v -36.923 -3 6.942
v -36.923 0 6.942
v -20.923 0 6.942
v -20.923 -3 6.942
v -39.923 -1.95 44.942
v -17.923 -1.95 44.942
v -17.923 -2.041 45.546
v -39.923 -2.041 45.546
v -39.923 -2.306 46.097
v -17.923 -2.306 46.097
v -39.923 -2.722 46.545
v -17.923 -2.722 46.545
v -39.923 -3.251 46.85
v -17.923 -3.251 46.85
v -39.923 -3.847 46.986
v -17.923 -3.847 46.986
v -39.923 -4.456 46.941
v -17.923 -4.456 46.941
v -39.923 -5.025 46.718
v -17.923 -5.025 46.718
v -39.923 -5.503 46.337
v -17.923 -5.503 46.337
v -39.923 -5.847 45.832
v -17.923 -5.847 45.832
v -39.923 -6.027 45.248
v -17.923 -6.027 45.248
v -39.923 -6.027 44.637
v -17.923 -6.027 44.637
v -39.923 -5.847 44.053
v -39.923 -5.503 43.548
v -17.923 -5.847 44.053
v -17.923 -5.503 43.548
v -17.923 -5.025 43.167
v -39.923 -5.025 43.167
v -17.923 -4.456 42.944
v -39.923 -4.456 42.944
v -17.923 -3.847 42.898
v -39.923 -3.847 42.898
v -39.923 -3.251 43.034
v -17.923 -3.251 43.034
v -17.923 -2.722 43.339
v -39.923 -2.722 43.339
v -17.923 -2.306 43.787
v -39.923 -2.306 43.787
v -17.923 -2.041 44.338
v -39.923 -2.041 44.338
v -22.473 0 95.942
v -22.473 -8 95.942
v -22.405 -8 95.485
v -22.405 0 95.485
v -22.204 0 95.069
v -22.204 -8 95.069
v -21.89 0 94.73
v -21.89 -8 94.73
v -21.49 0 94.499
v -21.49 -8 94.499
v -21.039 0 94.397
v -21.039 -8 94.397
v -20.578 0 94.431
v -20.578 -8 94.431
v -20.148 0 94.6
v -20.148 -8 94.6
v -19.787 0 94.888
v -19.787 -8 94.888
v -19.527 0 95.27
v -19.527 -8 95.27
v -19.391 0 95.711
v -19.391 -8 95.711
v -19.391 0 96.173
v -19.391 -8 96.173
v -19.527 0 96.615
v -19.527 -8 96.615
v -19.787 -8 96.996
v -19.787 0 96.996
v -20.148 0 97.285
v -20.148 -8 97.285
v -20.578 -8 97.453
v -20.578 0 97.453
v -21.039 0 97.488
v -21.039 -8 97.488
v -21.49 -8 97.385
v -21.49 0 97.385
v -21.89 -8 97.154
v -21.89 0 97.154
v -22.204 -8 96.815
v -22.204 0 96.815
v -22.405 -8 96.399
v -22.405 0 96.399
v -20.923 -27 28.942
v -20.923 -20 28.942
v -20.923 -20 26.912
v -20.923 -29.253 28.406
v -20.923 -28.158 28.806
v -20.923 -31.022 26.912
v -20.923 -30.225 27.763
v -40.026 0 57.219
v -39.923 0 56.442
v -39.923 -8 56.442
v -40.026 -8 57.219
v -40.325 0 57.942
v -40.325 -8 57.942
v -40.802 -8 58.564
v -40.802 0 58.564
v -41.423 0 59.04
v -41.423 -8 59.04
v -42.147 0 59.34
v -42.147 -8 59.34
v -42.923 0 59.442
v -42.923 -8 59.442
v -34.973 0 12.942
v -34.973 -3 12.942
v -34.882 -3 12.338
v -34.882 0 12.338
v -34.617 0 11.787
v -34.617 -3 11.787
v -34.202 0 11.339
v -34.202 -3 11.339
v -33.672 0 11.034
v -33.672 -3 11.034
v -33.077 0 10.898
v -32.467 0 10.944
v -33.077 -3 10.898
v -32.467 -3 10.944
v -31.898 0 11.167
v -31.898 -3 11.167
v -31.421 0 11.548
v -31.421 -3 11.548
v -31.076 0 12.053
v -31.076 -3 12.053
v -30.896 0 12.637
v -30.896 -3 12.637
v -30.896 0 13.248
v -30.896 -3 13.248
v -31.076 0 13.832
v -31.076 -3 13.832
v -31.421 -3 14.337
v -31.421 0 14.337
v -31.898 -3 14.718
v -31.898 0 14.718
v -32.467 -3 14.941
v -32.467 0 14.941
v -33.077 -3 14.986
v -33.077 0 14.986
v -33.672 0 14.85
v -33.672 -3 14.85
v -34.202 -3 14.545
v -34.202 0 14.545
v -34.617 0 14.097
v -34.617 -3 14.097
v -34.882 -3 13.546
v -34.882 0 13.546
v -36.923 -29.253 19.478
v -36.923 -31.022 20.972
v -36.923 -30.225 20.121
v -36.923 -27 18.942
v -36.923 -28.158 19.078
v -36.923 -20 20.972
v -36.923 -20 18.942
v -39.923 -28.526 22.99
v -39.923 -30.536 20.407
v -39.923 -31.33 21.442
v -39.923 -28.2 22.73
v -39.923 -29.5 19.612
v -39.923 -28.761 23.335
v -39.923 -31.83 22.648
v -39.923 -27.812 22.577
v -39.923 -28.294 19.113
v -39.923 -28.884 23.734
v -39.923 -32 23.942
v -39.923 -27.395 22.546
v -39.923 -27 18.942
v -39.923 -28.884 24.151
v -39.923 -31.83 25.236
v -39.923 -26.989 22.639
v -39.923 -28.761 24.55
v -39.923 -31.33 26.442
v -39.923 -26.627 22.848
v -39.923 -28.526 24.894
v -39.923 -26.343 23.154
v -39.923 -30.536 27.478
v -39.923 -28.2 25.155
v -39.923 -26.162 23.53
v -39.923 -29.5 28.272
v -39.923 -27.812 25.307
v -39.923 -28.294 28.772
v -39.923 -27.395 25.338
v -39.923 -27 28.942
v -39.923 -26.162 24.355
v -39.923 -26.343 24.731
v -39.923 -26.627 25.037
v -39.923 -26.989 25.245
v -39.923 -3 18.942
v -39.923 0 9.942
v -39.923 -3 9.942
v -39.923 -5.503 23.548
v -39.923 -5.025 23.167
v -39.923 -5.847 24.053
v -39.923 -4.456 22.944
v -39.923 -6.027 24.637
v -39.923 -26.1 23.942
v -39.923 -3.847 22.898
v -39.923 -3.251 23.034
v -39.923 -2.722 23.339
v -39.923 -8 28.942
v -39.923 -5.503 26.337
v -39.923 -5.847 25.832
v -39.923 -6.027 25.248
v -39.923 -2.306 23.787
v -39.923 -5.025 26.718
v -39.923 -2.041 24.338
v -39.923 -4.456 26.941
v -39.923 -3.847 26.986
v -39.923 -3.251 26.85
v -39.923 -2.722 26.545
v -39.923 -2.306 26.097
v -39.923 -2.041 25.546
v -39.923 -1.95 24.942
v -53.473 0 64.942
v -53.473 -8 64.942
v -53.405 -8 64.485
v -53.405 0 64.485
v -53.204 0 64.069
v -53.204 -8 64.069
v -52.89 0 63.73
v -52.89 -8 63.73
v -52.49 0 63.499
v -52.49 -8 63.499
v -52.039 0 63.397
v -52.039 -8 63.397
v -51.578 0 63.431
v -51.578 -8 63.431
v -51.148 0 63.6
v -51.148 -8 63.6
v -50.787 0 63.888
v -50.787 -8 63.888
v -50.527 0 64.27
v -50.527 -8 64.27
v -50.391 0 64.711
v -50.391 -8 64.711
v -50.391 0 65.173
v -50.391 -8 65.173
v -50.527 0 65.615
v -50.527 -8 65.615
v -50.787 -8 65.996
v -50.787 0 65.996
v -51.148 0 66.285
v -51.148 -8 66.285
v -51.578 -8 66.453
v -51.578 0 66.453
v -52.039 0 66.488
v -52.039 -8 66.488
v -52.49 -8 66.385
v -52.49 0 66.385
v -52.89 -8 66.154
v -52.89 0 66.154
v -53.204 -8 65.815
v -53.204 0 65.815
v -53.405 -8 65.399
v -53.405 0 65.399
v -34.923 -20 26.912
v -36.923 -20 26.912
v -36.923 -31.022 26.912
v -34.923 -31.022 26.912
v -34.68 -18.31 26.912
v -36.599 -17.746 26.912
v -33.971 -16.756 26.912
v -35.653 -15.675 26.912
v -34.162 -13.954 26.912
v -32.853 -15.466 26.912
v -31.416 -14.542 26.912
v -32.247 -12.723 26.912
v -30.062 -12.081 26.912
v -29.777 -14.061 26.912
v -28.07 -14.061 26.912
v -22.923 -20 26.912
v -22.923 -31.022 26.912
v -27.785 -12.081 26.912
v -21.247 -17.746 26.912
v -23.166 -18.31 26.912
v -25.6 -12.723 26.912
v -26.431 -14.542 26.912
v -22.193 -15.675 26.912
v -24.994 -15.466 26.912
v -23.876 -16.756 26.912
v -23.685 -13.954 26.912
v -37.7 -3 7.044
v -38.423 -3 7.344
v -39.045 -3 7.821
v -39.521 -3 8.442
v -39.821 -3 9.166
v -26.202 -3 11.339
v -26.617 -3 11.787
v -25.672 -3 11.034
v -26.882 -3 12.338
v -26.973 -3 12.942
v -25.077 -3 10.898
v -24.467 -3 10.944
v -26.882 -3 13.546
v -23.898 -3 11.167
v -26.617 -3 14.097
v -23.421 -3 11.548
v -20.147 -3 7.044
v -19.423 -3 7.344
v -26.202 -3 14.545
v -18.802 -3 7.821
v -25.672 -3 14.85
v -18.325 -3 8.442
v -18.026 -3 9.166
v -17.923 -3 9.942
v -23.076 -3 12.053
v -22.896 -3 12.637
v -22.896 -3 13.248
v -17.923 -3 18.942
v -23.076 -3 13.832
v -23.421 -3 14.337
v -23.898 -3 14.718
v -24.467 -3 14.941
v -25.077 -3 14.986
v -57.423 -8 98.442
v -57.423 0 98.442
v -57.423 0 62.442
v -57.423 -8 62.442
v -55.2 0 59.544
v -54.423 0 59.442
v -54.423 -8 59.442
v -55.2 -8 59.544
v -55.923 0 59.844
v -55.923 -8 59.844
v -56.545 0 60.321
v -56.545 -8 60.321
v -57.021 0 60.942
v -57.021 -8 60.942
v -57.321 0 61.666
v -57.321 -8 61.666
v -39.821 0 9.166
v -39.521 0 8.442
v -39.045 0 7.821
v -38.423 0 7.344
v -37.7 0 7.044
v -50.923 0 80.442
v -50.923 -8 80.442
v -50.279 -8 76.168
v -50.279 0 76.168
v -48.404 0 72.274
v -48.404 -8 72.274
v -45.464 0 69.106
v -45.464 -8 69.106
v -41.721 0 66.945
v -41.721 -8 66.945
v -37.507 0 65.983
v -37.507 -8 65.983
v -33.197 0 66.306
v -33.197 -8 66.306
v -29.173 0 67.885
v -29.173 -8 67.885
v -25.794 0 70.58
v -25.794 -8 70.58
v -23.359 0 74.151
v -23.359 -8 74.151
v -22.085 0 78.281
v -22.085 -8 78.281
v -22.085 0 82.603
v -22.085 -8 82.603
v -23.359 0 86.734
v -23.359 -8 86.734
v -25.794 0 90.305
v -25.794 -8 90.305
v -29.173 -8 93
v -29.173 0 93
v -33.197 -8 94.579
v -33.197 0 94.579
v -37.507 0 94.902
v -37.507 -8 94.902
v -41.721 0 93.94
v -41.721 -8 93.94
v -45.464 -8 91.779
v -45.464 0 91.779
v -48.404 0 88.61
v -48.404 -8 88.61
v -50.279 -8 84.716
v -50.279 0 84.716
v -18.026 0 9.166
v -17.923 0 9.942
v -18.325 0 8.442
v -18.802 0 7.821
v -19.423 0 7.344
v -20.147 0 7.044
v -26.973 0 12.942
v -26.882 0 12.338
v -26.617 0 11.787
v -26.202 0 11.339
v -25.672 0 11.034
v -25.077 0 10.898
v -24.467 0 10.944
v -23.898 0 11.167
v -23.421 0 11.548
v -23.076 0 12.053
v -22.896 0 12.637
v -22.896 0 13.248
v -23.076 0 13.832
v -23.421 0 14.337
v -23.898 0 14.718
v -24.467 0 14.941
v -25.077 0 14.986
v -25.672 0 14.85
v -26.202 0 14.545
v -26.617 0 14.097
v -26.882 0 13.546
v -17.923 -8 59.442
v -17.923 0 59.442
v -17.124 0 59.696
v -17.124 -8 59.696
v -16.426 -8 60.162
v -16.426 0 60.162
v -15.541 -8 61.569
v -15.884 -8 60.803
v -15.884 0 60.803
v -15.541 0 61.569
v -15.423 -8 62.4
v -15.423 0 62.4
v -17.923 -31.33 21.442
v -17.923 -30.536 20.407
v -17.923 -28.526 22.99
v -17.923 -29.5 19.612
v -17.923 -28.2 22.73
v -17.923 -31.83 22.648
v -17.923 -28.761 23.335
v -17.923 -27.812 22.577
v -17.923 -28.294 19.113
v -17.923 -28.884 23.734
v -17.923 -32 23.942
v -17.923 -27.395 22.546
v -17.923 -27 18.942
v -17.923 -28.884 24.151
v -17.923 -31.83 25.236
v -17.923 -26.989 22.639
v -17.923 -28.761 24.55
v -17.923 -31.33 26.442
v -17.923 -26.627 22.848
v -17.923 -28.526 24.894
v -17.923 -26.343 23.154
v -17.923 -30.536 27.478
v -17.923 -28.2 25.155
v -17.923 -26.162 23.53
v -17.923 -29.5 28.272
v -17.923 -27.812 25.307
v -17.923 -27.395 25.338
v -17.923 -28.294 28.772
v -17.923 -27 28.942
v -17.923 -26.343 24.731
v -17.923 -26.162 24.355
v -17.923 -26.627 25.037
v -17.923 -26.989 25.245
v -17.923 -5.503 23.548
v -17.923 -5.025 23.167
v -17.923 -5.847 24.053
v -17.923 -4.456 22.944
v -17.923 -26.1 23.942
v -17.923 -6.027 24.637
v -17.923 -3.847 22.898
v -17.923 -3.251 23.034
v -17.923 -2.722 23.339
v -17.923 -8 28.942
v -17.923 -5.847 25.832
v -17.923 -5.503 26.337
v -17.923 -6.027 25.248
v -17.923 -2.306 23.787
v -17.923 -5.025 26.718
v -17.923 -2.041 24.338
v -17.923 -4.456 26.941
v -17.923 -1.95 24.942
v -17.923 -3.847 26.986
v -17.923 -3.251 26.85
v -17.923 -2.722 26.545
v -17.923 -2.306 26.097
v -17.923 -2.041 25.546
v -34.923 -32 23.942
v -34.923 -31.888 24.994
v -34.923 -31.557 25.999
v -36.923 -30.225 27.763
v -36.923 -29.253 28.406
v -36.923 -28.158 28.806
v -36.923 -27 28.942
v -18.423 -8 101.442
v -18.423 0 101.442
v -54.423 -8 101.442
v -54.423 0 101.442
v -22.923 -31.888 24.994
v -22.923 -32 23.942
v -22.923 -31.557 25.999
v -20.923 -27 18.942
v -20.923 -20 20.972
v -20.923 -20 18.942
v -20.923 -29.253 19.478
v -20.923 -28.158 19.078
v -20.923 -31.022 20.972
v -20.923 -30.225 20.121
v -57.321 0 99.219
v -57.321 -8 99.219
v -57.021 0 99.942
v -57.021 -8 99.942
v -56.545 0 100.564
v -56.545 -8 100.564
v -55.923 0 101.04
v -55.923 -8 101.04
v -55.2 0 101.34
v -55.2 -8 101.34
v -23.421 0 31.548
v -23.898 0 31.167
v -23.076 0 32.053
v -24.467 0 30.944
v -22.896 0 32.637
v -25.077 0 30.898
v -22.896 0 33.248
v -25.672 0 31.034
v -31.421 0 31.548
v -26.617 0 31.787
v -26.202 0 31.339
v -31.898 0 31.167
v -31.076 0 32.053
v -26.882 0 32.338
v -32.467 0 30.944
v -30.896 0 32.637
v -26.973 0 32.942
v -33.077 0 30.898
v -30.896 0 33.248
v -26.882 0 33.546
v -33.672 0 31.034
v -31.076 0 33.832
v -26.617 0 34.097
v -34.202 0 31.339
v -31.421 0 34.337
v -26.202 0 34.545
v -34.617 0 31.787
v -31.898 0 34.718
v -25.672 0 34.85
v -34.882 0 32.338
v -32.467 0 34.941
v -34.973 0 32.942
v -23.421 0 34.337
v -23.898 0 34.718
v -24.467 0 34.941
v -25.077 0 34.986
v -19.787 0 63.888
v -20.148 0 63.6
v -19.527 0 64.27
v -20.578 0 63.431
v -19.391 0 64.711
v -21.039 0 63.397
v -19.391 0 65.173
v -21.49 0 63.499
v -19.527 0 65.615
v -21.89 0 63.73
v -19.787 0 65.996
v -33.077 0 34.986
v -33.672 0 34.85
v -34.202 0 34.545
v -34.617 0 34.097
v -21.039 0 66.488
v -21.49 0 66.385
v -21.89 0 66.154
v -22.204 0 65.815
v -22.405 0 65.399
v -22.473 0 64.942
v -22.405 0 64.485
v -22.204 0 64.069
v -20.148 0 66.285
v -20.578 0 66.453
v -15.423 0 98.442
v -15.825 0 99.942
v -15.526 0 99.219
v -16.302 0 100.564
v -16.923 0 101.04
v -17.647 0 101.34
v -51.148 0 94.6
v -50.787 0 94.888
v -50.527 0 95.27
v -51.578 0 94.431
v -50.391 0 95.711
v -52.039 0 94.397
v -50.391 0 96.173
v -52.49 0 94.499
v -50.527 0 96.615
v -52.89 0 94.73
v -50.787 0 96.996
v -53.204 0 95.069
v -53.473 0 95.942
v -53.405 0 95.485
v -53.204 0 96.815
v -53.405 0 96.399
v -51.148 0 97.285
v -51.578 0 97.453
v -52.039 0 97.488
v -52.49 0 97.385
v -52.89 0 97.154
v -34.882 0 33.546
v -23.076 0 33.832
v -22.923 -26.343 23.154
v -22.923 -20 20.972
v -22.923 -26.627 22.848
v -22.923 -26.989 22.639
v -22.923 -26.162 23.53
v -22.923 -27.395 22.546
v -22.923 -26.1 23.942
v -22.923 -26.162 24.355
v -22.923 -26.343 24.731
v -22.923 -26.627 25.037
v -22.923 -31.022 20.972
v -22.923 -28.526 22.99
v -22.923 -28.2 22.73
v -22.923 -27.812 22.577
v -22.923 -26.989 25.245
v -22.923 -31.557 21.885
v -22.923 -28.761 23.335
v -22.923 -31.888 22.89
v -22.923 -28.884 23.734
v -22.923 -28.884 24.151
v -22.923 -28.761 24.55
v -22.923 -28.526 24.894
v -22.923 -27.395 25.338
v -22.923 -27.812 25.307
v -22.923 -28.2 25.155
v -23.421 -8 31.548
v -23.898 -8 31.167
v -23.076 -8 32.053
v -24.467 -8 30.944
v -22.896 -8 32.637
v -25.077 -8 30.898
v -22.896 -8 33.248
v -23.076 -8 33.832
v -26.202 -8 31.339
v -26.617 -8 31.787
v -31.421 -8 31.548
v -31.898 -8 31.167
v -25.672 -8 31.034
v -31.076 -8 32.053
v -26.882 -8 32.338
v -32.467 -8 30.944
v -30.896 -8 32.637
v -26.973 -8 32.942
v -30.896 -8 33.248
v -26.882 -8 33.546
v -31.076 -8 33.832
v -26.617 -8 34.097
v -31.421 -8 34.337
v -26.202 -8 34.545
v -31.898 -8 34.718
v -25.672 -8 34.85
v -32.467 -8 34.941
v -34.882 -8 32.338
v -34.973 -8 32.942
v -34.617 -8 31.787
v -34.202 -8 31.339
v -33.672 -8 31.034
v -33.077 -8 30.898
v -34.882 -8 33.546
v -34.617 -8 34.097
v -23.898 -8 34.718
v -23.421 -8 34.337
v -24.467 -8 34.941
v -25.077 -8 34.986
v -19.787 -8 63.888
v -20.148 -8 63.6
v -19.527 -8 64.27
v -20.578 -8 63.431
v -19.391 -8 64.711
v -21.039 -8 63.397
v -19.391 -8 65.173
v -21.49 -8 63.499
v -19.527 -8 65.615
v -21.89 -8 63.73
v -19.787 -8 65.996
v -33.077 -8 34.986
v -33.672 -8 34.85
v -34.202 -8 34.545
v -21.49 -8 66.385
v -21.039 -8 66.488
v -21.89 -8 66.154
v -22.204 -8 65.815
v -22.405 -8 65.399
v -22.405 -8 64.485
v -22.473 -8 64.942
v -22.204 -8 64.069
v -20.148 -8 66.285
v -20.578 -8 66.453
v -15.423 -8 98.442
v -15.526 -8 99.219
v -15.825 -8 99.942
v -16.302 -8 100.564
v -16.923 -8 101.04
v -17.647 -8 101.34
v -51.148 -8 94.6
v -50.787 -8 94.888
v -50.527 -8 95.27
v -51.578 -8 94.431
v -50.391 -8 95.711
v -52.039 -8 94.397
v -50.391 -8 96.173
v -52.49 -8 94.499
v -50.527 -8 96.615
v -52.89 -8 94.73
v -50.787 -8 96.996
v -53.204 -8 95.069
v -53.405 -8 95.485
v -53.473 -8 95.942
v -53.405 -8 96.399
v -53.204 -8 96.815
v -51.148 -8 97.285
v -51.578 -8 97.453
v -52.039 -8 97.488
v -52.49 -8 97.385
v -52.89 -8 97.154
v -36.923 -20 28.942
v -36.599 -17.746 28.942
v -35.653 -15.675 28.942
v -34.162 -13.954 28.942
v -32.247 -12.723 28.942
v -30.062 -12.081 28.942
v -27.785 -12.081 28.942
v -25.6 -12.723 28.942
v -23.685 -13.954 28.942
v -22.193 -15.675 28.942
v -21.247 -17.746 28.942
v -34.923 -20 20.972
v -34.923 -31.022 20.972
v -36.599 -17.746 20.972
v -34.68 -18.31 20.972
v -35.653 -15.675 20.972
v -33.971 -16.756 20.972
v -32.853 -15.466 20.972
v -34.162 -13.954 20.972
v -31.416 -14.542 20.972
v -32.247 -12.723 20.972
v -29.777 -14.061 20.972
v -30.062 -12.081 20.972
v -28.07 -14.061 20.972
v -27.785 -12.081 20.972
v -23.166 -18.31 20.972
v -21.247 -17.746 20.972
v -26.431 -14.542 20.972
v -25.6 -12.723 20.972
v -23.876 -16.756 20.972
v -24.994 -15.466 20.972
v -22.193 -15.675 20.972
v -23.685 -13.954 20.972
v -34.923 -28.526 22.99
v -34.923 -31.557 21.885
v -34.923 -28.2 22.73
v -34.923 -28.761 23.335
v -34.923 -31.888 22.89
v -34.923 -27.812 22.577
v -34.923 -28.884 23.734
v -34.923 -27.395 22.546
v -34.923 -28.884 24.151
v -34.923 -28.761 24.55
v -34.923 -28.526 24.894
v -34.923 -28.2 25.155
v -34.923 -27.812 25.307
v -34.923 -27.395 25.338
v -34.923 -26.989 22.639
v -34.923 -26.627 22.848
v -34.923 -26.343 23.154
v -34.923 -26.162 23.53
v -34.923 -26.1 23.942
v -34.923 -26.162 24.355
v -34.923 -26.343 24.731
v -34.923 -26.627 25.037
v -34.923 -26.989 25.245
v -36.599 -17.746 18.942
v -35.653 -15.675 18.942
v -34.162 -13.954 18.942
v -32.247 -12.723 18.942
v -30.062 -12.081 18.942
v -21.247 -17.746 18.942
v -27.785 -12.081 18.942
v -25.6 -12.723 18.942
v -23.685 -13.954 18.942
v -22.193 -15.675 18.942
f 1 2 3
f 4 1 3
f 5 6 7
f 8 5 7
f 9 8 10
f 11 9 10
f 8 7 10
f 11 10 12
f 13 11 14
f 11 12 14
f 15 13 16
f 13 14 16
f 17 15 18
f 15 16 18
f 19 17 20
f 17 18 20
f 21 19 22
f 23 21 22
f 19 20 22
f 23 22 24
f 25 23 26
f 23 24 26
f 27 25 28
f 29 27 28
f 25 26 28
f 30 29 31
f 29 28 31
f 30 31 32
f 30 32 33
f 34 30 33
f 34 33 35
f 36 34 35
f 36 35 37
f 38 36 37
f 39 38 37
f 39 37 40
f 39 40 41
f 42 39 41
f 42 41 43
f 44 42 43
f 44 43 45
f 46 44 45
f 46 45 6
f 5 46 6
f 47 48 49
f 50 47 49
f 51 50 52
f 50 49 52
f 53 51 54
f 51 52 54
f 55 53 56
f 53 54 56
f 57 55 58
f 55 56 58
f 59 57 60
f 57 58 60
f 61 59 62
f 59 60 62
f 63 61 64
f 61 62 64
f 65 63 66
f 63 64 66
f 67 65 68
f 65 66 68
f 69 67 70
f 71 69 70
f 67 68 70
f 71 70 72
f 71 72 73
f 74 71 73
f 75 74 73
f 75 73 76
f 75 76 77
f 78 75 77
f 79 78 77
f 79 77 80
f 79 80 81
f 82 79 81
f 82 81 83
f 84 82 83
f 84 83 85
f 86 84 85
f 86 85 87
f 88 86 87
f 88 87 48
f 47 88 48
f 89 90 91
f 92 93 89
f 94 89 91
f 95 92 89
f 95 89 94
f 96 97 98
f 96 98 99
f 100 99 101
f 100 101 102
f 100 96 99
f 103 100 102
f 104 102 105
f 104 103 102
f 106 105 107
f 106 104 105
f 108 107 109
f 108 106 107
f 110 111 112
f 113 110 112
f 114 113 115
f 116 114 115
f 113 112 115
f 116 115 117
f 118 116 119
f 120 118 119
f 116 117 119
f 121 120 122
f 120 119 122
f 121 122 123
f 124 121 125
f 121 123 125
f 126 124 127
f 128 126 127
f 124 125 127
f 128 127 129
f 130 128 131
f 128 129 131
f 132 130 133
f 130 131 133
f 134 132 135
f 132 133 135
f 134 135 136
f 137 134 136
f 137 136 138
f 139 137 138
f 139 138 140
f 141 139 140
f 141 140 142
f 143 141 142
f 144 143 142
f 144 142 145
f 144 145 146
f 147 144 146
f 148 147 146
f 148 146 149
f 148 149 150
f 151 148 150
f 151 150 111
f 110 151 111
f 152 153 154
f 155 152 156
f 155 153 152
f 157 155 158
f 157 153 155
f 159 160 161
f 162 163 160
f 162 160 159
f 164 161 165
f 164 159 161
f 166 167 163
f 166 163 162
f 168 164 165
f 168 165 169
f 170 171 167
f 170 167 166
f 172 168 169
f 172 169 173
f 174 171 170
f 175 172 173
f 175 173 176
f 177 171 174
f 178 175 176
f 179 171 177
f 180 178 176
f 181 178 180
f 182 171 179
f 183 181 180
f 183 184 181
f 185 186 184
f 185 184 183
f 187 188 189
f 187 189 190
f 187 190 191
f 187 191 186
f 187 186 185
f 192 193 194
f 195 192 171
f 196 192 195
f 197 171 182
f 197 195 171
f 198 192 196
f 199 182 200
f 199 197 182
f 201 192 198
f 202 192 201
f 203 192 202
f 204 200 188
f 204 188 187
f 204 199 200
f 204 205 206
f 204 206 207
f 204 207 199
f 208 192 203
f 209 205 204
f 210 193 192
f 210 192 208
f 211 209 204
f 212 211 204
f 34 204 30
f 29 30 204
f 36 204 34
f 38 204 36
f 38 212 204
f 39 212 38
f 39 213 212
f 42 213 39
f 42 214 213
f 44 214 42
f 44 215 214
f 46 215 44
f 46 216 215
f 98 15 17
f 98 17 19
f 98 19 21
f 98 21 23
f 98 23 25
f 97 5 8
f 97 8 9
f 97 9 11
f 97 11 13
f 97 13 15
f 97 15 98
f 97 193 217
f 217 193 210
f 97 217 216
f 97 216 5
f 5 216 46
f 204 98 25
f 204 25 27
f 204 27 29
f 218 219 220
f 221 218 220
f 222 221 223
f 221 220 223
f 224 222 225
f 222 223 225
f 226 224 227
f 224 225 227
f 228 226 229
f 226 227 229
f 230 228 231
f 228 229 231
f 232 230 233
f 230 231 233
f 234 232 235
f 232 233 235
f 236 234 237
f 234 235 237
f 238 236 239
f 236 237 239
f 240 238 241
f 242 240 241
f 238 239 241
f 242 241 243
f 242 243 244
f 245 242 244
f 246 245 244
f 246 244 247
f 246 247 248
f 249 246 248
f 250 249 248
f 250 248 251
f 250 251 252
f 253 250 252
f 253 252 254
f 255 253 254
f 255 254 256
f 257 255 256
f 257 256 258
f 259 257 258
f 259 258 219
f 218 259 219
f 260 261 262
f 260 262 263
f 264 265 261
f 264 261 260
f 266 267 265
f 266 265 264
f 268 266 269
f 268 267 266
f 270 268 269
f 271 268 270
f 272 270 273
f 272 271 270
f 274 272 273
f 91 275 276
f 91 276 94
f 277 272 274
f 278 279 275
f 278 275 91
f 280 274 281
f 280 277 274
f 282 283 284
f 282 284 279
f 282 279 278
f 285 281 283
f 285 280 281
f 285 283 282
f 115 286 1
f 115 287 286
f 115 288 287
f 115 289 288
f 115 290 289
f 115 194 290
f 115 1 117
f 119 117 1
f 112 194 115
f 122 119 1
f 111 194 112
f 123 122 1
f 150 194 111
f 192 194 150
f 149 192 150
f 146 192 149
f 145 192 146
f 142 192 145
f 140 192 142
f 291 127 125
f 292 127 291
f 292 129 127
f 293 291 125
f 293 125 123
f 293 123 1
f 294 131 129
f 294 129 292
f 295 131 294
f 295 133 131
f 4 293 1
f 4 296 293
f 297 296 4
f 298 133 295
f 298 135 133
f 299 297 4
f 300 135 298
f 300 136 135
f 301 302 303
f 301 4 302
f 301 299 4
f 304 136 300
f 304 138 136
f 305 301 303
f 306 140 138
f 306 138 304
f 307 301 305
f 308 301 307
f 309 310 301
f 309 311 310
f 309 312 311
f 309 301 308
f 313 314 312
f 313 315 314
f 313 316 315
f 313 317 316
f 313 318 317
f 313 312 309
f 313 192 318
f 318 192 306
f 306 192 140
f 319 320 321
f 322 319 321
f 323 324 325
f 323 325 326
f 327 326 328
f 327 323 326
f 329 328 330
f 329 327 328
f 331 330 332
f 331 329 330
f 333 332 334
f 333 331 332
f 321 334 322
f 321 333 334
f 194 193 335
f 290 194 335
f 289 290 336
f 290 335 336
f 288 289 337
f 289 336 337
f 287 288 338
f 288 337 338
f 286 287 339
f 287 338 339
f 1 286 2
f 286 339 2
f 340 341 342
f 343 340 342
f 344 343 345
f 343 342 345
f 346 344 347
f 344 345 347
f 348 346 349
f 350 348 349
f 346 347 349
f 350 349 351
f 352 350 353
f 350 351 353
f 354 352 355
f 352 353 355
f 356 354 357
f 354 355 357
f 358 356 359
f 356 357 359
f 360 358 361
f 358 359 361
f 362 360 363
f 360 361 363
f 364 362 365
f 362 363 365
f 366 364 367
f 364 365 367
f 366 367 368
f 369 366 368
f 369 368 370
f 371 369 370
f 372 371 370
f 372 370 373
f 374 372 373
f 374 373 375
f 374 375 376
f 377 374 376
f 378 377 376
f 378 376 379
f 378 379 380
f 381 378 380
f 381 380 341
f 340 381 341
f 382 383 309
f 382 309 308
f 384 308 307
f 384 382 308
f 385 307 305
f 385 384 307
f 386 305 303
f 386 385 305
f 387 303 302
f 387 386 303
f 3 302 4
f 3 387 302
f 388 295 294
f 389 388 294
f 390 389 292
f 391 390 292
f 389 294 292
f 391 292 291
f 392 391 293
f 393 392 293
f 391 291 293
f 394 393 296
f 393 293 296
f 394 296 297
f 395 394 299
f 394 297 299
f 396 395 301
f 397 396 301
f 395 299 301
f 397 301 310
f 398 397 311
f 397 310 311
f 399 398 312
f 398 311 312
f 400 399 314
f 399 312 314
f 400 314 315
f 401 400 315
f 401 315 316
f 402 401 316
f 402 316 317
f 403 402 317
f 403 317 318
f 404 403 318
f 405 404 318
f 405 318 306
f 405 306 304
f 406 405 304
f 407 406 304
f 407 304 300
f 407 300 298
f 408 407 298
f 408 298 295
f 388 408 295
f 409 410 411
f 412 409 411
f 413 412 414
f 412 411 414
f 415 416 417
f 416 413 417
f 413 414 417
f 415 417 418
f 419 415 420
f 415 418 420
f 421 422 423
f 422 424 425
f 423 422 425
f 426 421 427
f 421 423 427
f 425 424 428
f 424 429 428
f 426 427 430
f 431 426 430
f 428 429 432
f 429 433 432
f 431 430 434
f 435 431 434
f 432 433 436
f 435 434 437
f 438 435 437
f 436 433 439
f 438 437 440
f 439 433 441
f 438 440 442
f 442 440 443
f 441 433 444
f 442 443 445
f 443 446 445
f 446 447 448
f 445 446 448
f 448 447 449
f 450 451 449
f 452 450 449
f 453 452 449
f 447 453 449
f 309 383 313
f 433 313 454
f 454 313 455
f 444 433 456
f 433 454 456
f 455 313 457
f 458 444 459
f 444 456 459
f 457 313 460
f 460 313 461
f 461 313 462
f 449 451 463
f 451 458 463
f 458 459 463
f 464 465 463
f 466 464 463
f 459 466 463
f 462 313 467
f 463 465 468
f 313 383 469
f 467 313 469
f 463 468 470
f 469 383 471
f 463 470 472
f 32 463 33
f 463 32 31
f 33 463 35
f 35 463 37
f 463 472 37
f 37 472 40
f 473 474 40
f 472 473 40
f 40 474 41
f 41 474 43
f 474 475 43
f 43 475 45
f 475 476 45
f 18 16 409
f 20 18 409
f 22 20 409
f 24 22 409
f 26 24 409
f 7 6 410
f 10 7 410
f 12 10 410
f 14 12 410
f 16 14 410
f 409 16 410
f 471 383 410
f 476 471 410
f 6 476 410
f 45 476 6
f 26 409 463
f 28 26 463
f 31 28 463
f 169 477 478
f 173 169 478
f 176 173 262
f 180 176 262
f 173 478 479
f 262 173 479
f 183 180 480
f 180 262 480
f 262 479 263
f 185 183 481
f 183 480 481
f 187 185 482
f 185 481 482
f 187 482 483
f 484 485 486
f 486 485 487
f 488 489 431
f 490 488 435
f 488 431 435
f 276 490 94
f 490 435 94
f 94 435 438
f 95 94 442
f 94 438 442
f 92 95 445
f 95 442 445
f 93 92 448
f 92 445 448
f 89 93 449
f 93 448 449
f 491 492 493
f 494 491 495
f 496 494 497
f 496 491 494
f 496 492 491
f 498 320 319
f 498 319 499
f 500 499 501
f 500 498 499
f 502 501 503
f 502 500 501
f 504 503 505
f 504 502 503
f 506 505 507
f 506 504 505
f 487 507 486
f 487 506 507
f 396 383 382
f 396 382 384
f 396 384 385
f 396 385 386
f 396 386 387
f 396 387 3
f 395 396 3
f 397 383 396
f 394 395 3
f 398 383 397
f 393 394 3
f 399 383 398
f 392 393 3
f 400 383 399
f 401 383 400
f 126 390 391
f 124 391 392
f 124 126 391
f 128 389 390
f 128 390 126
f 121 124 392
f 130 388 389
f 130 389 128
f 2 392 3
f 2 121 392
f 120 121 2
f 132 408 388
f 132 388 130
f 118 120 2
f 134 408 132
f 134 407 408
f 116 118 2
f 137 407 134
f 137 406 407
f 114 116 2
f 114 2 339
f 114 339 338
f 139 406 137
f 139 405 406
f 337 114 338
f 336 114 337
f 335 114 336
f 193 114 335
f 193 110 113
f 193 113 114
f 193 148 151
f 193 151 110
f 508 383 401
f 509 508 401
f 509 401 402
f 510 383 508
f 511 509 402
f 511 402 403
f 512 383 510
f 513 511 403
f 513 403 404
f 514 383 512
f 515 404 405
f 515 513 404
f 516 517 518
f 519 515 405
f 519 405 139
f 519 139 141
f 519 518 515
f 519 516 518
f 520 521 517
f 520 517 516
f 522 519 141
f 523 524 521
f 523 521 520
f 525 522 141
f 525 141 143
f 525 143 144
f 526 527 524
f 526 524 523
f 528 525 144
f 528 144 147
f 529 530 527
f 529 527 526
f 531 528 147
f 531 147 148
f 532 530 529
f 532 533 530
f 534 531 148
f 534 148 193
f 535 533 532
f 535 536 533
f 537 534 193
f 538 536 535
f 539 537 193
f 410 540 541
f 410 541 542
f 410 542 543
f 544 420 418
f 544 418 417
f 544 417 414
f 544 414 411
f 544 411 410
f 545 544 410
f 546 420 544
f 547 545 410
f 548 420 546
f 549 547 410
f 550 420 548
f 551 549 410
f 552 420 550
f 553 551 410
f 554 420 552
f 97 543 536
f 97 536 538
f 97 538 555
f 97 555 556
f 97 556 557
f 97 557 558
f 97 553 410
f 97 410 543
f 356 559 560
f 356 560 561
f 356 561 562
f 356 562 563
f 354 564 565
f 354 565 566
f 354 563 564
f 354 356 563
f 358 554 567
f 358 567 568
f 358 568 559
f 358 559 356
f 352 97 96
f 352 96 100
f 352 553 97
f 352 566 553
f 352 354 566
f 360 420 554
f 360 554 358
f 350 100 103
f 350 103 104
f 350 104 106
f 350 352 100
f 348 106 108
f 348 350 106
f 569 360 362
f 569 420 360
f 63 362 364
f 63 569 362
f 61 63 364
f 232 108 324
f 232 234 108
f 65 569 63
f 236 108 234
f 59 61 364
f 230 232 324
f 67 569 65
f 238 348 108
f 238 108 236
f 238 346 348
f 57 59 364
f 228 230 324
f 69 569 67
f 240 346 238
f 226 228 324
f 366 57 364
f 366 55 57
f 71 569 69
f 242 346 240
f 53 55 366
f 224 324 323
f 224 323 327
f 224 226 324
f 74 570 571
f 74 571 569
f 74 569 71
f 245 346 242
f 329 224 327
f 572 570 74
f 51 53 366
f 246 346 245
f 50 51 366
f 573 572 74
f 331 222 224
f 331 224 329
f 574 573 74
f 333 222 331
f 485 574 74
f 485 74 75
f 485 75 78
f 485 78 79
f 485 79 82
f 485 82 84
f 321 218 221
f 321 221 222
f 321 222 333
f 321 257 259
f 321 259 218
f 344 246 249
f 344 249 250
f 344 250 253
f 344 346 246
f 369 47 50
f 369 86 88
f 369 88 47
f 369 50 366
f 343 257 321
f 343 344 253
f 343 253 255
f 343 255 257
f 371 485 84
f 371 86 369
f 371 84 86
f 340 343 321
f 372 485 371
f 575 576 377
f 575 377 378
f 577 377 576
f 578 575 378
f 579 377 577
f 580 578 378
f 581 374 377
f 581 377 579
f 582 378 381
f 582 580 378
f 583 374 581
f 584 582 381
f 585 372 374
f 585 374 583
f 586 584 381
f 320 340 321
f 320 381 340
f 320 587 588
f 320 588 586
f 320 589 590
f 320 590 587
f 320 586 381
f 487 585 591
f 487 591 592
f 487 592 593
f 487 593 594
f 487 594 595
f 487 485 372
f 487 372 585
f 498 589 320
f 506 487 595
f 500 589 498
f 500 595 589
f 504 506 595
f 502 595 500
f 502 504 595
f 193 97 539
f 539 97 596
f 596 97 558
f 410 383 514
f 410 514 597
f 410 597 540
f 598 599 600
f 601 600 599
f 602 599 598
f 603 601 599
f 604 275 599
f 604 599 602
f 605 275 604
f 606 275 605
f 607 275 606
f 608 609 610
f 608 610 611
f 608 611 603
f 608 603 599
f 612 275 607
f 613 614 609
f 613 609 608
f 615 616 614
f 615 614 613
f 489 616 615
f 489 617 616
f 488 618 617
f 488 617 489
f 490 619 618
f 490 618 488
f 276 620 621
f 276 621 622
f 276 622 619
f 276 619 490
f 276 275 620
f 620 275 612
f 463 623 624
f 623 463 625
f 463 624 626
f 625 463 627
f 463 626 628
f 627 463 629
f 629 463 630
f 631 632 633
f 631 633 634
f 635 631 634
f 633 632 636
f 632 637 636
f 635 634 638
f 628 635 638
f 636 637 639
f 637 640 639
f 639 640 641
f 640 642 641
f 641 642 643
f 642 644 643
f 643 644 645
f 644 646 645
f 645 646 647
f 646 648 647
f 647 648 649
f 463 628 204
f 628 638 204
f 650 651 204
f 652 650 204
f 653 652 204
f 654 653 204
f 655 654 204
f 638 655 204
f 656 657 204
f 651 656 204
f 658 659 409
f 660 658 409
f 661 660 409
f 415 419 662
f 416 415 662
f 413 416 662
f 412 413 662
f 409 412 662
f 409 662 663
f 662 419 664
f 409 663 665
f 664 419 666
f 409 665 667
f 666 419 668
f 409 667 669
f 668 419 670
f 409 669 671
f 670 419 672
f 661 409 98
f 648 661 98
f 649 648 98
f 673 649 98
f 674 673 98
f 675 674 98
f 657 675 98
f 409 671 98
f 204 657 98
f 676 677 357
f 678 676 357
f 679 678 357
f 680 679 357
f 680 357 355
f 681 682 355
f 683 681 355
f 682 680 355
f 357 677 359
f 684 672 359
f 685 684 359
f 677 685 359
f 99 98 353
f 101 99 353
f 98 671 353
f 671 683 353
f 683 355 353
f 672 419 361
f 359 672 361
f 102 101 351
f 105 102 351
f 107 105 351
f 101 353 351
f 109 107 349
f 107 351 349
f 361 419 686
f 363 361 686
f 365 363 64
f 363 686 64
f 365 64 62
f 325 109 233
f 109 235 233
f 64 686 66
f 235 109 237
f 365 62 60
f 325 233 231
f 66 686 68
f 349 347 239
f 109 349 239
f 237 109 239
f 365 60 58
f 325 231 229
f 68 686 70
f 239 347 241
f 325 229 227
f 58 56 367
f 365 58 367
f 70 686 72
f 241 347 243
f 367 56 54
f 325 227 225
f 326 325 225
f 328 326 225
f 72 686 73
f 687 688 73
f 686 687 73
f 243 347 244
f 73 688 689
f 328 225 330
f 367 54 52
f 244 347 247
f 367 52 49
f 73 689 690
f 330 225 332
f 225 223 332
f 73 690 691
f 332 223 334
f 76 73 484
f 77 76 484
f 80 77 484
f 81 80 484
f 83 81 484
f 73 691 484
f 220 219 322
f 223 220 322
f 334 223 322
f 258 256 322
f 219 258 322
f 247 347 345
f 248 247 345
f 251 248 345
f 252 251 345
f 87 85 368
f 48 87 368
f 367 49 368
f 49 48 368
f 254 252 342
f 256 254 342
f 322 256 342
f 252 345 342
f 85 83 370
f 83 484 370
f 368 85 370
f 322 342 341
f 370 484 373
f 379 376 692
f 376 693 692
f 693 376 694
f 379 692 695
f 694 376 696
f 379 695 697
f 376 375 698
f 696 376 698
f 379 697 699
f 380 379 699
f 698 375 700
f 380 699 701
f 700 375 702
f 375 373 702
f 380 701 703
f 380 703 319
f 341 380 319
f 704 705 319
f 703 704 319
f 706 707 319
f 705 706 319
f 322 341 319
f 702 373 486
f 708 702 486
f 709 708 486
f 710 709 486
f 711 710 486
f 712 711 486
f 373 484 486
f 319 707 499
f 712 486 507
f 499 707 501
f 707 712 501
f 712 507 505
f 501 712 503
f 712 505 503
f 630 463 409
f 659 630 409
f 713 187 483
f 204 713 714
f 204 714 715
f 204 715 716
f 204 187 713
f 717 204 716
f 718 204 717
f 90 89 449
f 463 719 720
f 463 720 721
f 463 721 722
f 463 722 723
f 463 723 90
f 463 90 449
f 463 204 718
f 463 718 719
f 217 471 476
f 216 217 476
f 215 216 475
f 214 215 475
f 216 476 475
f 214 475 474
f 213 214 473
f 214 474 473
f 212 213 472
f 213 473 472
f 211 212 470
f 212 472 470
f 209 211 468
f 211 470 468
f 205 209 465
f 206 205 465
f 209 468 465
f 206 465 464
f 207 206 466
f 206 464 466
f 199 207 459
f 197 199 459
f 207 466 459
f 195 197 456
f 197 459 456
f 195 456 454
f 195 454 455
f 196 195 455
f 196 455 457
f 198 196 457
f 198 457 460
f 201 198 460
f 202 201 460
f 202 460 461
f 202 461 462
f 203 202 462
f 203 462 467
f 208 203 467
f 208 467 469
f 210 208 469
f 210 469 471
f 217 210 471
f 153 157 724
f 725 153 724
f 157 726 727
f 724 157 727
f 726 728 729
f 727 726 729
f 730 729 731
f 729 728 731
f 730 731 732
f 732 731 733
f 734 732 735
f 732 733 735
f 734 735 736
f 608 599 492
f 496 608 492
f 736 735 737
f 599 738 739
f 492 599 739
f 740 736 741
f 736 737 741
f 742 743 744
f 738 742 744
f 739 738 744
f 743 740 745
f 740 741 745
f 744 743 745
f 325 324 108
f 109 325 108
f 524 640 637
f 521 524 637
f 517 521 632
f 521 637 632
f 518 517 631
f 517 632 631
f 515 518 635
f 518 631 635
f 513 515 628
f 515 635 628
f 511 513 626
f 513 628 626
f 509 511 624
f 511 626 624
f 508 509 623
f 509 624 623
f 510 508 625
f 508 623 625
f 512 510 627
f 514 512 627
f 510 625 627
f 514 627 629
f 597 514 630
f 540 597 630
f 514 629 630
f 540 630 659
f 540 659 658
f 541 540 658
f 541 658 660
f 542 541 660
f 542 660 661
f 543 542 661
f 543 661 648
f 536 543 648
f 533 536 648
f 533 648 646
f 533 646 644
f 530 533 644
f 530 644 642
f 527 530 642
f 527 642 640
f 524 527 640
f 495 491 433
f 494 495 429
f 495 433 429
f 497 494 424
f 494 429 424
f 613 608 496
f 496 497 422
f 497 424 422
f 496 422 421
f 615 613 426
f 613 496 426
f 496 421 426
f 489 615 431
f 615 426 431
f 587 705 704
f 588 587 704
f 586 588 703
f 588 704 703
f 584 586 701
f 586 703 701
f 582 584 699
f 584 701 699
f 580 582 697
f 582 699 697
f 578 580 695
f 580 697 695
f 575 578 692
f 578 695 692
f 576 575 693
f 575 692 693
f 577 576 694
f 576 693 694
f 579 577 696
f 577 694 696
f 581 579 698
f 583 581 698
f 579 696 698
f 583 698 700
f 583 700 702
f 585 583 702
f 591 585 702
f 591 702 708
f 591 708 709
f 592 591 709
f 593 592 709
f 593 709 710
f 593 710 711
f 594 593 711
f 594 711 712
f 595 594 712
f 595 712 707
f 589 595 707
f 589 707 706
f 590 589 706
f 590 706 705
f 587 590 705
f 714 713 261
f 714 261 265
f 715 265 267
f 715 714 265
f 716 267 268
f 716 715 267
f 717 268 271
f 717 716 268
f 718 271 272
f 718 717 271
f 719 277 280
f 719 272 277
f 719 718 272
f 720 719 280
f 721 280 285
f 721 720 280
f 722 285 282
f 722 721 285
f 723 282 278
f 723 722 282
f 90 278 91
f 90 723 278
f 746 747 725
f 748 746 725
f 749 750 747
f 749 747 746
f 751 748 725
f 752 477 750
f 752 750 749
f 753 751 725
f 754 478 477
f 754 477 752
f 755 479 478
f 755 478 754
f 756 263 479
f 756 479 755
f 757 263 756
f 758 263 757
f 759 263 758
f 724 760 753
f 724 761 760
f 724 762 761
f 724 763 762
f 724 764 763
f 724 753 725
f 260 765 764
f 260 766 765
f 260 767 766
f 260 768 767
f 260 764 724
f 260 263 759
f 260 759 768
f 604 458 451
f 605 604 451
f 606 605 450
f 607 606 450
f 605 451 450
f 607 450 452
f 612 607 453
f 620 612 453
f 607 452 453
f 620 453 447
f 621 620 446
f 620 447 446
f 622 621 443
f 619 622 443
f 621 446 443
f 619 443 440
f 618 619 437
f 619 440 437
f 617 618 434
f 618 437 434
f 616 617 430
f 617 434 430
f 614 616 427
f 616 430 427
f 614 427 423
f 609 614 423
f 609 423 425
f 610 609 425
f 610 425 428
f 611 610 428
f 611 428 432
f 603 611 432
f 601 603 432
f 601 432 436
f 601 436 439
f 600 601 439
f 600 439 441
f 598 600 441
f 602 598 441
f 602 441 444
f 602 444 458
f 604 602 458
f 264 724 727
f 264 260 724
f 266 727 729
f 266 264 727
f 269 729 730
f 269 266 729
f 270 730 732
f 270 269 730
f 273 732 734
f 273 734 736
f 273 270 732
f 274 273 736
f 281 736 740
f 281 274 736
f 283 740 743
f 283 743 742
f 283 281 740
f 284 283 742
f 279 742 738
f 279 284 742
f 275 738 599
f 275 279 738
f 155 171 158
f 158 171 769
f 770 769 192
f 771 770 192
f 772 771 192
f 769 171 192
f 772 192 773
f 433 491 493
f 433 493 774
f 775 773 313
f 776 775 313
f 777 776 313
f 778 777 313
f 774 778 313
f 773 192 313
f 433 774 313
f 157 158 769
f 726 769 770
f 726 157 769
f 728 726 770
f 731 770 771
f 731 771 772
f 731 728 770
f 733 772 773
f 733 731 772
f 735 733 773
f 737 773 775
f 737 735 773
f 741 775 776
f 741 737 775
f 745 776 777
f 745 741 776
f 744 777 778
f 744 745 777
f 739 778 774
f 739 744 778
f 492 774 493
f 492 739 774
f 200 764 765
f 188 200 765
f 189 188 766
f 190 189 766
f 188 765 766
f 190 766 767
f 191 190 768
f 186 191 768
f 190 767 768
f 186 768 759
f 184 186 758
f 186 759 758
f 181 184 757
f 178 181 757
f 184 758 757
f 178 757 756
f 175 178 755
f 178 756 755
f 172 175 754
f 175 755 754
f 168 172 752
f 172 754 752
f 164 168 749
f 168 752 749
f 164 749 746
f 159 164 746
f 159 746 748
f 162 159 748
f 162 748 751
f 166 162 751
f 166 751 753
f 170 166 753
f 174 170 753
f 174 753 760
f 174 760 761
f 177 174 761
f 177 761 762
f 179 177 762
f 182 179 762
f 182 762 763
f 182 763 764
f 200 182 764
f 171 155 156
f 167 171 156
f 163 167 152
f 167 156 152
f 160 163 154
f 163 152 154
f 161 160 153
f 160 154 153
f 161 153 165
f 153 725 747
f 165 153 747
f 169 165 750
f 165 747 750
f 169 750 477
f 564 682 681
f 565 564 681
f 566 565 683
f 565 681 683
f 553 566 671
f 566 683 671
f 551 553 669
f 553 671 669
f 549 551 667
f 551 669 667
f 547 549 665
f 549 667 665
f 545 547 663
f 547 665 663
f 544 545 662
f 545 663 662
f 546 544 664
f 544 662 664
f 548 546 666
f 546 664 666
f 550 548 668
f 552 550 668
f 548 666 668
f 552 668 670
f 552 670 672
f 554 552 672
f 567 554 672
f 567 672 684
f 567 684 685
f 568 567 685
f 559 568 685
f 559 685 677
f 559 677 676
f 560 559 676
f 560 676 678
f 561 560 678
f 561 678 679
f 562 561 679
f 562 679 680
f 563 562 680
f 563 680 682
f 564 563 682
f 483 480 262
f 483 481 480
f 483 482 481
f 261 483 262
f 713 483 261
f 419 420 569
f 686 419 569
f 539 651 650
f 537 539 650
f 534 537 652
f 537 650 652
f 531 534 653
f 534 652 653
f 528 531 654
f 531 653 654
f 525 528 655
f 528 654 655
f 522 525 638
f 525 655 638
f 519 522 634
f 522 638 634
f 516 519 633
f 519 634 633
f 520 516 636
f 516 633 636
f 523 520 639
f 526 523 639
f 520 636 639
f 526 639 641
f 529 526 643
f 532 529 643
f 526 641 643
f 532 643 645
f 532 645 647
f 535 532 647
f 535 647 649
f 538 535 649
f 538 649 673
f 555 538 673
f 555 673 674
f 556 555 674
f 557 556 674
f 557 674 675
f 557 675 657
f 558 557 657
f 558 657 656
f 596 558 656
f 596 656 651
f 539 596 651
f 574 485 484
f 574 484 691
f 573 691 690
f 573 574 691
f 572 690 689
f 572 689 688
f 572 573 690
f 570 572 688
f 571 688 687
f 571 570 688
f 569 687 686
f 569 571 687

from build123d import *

# Parameters (mm, degrees)
F0_W          = 22
F0_H          = 42
F1_DEPTH      = 3
F2_W          = 3
F2_H          = 30
F2_W_2        = 5
F3_DEPTH      = 22
F4_D          = 4.1
F7_DEPTH      = 5
F8_DEPTH      = 2.97
F9_R          = 4.99999
F11_D         = 4.1
F12_D         = 2.8
F13_W         = 22
F13_H         = 10.5
F14_DEPTH     = 8
F15_T1_DEPTH  = 8
F15_T3_DEPTH  = 18
F15_T5_DEPTH  = 18
F15_T7_DEPTH  = 22.7901994578
F15_T9_DEPTH  = 23
F15_T11_DEPTH = 23
F15_T13_DEPTH = 23
F16_D         = 29
F17_D         = 3.1


# Not quite as in the source:
# - a fillet or chamfer that OpenCascade refuses, or shapes differently, is made with other operations: its cross-section is extruded or revolved along the edge and cut away or added
# - a fillet or chamfer is up to 0.001 mm smaller than in the source, because OpenCascade refuses the exact size


with BuildPart() as f1:
    # F0 (on Front) → F1 (new body)
    with BuildSketch(Plane.XZ):
        with Locations((-28.9233987555, 27.9422005266)):
            Rectangle(F0_W, F0_H)
    extrude(amount=F1_DEPTH)

    # F2 (on face) → F3 (join)
    with BuildSketch(Plane(origin=(-39.9233987555, 0, 0), x_dir=(0, -1, 0), z_dir=(-1, 0, 0))):
        with Locations((1.5, 33.9422005266)):
            Rectangle(F2_W, F2_H)
        with Locations((5.5, 33.9422005266)):
            Rectangle(F2_W_2, F2_H)
    extrude(amount=-F3_DEPTH)

    # F4 (through all)
    with Locations(Plane(origin=(0, 0, 0), x_dir=(1, 0, 0), z_dir=(0, 1, 0))):
        with Locations((-24.9233987555, -12.9422005266), (-32.9233987555, -12.9422005266), (-32.9233987555, -32.9422005266), (-24.9233987555, -32.9422005266)):
            Hole(F4_D / 2)

    # F6 (on line) → F7 (join, symmetric)
    with BuildSketch(Plane.XY.offset(23.9422005266)):
        with BuildLine():
            ThreePointArc((-36.9233987555, -20), (-28.9233987555, -12), (-20.9233987555, -20))
            Line((-20.9233987555, -20), (-20.9233987555, -32))
            Line((-20.9233987555, -32), (-17.9233987555, -32))
            Line((-17.9233987555, -32), (-17.9233987555, 0))
            Line((-17.9233987555, 0), (-39.9233987555, 0))
            Line((-39.9233987555, 0), (-39.9233987555, -32))
            Line((-39.9233987555, -32), (-36.9233987555, -32))
            Line((-36.9233987555, -32), (-36.9233987555, -20))
        make_face()
    extrude(amount=F7_DEPTH, both=True)

    # F6 (on line) → F8 (join, symmetric)
    with BuildSketch(Plane.XY.offset(23.9422005266)):
        with BuildLine():
            ThreePointArc((-34.9233987555, -20), (-28.9233987555, -14), (-22.9233987555, -20))
            Line((-22.9233987555, -20), (-22.9233987555, -25.2915026221))
            ThreePointArc((-22.9233987555, -25.2915026221), (-21.4400839819, -22.8284271247), (-20.9233987555, -20))
            ThreePointArc((-20.9233987555, -20), (-28.9233987555, -12), (-36.9233987555, -20))
            ThreePointArc((-36.9233987555, -20), (-36.406713529, -22.8284271247), (-34.9233987555, -25.2915026221))
            Line((-34.9233987555, -25.2915026221), (-34.9233987555, -20))
        make_face()
        with BuildLine():
            Line((-34.9233987555, -32), (-34.9233987555, -25.2915026221))
            ThreePointArc((-34.9233987555, -25.2915026221), (-36.406713529, -22.8284271247), (-36.9233987555, -20))
            Line((-36.9233987555, -20), (-36.9233987555, -32))
            Line((-36.9233987555, -32), (-34.9233987555, -32))
        make_face()
        with BuildLine():
            ThreePointArc((-20.9233987555, -20), (-21.4400839819, -22.8284271247), (-22.9233987555, -25.2915026221))
            Line((-22.9233987555, -25.2915026221), (-22.9233987555, -32))
            Line((-22.9233987555, -32), (-20.9233987555, -32))
            Line((-20.9233987555, -32), (-20.9233987555, -20))
        make_face()
    extrude(amount=F8_DEPTH, both=True)

    # F9 (radius 5 in the source; OpenCascade refuses exactly that, so slightly less here)
    f9_edges = [f1.edges().sort_by_distance(p)[0] for p in [
        (-38.423399, -32, 28.942201),
        (-38.423399, -32, 18.942201),
        (-19.423399, -32, 18.942201),
        (-19.423399, -32, 28.942201),
    ]]
    fillet(f9_edges, radius=F9_R)

    # F11 (through all)
    with Locations(Plane(origin=(-39.9233987555, 0, 0), x_dir=(0, -1, 0), z_dir=(-1, 0, 0))):
        with Locations((4, 44.9422005266), (4, 24.9422005266)):
            Hole(F11_D / 2)

    # F12 (through all)
    with Locations(Plane(origin=(-39.9233987555, 0, 0), x_dir=(0, -1, 0), z_dir=(-1, 0, 0))):
        with Locations((27.5, 23.9422005266)):
            Hole(F12_D / 2)

    # F13 (on Front) → F14 (join)
    with BuildSketch(Plane.XZ):
        Polygon((-57.4233987555, 59.4422005266), (-39.9233987555, 59.4422005266), (-17.9233987555, 59.4422005266), (-15.4233987555, 59.4422005266), (-15.4233987555, 101.4422005266), (-57.4233987555, 101.4422005266), align=None)
        with Locations((-28.9233987555, 54.1922005266)):
            Rectangle(F13_W, F13_H)
    extrude(amount=F14_DEPTH)

    # F15: fillet of radius 3 on 7 edges, made by hand

    # F15_s2 → F15_t1 (join)
    with BuildSketch(Plane.XZ):
        with BuildLine():
            ThreePointArc((-39.9233987555, 56.4422005266), (-40.8020784119, 58.5635208702), (-42.9233987555, 59.4422005266))
            Line((-42.9233987555, 59.4422005266), (-39.9233987555, 59.4422005266))
            Line((-39.9233987555, 59.4422005266), (-39.9233987555, 56.4422005266))
        make_face()
    extrude(amount=F15_T1_DEPTH)

    # F15_s4 → F15_t3 (cut)
    with BuildSketch(Plane.XZ.offset(-7.5)):
        with BuildLine():
            ThreePointArc((-39.9233987555, 9.9422005266), (-39.0447190991, 7.820880183), (-36.9233987555, 6.9422005266))
            Line((-36.9233987555, 6.9422005266), (-39.9233987555, 6.9422005266))
            Line((-39.9233987555, 6.9422005266), (-39.9233987555, 9.9422005266))
        make_face()
    extrude(amount=F15_T3_DEPTH, mode=Mode.SUBTRACT)

    # F15_s6 → F15_t5 (cut)
    with BuildSketch(Plane.XZ.offset(-7.5)):
        with BuildLine():
            ThreePointArc((-17.9233987555, 9.9422005266), (-18.8020784119, 7.820880183), (-20.9233987555, 6.9422005266))
            Line((-20.9233987555, 6.9422005266), (-17.9233987555, 6.9422005266))
            Line((-17.9233987555, 6.9422005266), (-17.9233987555, 9.9422005266))
        make_face()
    extrude(amount=F15_T5_DEPTH, mode=Mode.SUBTRACT)

    # F15_s8 → F15_t7 (cut)
    with BuildSketch(Plane.XZ.offset(-7.3950997289)):
        with BuildLine():
            ThreePointArc((-17.9233987555, 59.4422005266), (-16.132110908, 60.463748745), (-15.4233987555, 62.4002404181))
            Line((-15.4233987555, 62.4002404181), (-15.4233987555, 59.4422005266))
            Line((-15.4233987555, 59.4422005266), (-17.9233987555, 59.4422005266))
        make_face()
    extrude(amount=F15_T7_DEPTH, mode=Mode.SUBTRACT)

    # F15_s10 → F15_t9 (cut)
    with BuildSketch(Plane.XZ.offset(-7.5)):
        with BuildLine():
            ThreePointArc((-18.4233987555, 101.4422005266), (-16.3020784119, 100.5635208702), (-15.4233987555, 98.4422005266))
            Line((-15.4233987555, 98.4422005266), (-15.4233987555, 101.4422005266))
            Line((-15.4233987555, 101.4422005266), (-18.4233987555, 101.4422005266))
        make_face()
    extrude(amount=F15_T9_DEPTH, mode=Mode.SUBTRACT)

    # F15_s12 → F15_t11 (cut)
    with BuildSketch(Plane.XZ.offset(-7.5)):
        with BuildLine():
            ThreePointArc((-57.4233987555, 98.4422005266), (-56.5447190991, 100.5635208702), (-54.4233987555, 101.4422005266))
            Line((-54.4233987555, 101.4422005266), (-57.4233987555, 101.4422005266))
            Line((-57.4233987555, 101.4422005266), (-57.4233987555, 98.4422005266))
        make_face()
    extrude(amount=F15_T11_DEPTH, mode=Mode.SUBTRACT)

    # F15_s14 → F15_t13 (cut)
    with BuildSketch(Plane.XZ.offset(-7.5)):
        with BuildLine():
            ThreePointArc((-54.4233987555, 59.4422005266), (-56.5447190991, 60.320880183), (-57.4233987555, 62.4422005266))
            Line((-57.4233987555, 62.4422005266), (-57.4233987555, 59.4422005266))
            Line((-57.4233987555, 59.4422005266), (-54.4233987555, 59.4422005266))
        make_face()
    extrude(amount=F15_T13_DEPTH, mode=Mode.SUBTRACT)

    # F16 (through all)
    with Locations(Plane(origin=(0, 0, 0), x_dir=(1, 0, 0), z_dir=(0, 1, 0))):
        with Locations((-36.4233987555, -80.4422005266)):
            Hole(F16_D / 2)

    # F17 (through all)
    with Locations(Plane(origin=(0, 0, 0), x_dir=(1, 0, 0), z_dir=(0, 1, 0))):
        with Locations((-51.9233987555, -95.9422005266), (-20.9233987555, -95.9422005266), (-20.9233987555, -64.9422005266), (-51.9233987555, -64.9422005266)):
            Hole(F17_D / 2)


solid = f1.part
